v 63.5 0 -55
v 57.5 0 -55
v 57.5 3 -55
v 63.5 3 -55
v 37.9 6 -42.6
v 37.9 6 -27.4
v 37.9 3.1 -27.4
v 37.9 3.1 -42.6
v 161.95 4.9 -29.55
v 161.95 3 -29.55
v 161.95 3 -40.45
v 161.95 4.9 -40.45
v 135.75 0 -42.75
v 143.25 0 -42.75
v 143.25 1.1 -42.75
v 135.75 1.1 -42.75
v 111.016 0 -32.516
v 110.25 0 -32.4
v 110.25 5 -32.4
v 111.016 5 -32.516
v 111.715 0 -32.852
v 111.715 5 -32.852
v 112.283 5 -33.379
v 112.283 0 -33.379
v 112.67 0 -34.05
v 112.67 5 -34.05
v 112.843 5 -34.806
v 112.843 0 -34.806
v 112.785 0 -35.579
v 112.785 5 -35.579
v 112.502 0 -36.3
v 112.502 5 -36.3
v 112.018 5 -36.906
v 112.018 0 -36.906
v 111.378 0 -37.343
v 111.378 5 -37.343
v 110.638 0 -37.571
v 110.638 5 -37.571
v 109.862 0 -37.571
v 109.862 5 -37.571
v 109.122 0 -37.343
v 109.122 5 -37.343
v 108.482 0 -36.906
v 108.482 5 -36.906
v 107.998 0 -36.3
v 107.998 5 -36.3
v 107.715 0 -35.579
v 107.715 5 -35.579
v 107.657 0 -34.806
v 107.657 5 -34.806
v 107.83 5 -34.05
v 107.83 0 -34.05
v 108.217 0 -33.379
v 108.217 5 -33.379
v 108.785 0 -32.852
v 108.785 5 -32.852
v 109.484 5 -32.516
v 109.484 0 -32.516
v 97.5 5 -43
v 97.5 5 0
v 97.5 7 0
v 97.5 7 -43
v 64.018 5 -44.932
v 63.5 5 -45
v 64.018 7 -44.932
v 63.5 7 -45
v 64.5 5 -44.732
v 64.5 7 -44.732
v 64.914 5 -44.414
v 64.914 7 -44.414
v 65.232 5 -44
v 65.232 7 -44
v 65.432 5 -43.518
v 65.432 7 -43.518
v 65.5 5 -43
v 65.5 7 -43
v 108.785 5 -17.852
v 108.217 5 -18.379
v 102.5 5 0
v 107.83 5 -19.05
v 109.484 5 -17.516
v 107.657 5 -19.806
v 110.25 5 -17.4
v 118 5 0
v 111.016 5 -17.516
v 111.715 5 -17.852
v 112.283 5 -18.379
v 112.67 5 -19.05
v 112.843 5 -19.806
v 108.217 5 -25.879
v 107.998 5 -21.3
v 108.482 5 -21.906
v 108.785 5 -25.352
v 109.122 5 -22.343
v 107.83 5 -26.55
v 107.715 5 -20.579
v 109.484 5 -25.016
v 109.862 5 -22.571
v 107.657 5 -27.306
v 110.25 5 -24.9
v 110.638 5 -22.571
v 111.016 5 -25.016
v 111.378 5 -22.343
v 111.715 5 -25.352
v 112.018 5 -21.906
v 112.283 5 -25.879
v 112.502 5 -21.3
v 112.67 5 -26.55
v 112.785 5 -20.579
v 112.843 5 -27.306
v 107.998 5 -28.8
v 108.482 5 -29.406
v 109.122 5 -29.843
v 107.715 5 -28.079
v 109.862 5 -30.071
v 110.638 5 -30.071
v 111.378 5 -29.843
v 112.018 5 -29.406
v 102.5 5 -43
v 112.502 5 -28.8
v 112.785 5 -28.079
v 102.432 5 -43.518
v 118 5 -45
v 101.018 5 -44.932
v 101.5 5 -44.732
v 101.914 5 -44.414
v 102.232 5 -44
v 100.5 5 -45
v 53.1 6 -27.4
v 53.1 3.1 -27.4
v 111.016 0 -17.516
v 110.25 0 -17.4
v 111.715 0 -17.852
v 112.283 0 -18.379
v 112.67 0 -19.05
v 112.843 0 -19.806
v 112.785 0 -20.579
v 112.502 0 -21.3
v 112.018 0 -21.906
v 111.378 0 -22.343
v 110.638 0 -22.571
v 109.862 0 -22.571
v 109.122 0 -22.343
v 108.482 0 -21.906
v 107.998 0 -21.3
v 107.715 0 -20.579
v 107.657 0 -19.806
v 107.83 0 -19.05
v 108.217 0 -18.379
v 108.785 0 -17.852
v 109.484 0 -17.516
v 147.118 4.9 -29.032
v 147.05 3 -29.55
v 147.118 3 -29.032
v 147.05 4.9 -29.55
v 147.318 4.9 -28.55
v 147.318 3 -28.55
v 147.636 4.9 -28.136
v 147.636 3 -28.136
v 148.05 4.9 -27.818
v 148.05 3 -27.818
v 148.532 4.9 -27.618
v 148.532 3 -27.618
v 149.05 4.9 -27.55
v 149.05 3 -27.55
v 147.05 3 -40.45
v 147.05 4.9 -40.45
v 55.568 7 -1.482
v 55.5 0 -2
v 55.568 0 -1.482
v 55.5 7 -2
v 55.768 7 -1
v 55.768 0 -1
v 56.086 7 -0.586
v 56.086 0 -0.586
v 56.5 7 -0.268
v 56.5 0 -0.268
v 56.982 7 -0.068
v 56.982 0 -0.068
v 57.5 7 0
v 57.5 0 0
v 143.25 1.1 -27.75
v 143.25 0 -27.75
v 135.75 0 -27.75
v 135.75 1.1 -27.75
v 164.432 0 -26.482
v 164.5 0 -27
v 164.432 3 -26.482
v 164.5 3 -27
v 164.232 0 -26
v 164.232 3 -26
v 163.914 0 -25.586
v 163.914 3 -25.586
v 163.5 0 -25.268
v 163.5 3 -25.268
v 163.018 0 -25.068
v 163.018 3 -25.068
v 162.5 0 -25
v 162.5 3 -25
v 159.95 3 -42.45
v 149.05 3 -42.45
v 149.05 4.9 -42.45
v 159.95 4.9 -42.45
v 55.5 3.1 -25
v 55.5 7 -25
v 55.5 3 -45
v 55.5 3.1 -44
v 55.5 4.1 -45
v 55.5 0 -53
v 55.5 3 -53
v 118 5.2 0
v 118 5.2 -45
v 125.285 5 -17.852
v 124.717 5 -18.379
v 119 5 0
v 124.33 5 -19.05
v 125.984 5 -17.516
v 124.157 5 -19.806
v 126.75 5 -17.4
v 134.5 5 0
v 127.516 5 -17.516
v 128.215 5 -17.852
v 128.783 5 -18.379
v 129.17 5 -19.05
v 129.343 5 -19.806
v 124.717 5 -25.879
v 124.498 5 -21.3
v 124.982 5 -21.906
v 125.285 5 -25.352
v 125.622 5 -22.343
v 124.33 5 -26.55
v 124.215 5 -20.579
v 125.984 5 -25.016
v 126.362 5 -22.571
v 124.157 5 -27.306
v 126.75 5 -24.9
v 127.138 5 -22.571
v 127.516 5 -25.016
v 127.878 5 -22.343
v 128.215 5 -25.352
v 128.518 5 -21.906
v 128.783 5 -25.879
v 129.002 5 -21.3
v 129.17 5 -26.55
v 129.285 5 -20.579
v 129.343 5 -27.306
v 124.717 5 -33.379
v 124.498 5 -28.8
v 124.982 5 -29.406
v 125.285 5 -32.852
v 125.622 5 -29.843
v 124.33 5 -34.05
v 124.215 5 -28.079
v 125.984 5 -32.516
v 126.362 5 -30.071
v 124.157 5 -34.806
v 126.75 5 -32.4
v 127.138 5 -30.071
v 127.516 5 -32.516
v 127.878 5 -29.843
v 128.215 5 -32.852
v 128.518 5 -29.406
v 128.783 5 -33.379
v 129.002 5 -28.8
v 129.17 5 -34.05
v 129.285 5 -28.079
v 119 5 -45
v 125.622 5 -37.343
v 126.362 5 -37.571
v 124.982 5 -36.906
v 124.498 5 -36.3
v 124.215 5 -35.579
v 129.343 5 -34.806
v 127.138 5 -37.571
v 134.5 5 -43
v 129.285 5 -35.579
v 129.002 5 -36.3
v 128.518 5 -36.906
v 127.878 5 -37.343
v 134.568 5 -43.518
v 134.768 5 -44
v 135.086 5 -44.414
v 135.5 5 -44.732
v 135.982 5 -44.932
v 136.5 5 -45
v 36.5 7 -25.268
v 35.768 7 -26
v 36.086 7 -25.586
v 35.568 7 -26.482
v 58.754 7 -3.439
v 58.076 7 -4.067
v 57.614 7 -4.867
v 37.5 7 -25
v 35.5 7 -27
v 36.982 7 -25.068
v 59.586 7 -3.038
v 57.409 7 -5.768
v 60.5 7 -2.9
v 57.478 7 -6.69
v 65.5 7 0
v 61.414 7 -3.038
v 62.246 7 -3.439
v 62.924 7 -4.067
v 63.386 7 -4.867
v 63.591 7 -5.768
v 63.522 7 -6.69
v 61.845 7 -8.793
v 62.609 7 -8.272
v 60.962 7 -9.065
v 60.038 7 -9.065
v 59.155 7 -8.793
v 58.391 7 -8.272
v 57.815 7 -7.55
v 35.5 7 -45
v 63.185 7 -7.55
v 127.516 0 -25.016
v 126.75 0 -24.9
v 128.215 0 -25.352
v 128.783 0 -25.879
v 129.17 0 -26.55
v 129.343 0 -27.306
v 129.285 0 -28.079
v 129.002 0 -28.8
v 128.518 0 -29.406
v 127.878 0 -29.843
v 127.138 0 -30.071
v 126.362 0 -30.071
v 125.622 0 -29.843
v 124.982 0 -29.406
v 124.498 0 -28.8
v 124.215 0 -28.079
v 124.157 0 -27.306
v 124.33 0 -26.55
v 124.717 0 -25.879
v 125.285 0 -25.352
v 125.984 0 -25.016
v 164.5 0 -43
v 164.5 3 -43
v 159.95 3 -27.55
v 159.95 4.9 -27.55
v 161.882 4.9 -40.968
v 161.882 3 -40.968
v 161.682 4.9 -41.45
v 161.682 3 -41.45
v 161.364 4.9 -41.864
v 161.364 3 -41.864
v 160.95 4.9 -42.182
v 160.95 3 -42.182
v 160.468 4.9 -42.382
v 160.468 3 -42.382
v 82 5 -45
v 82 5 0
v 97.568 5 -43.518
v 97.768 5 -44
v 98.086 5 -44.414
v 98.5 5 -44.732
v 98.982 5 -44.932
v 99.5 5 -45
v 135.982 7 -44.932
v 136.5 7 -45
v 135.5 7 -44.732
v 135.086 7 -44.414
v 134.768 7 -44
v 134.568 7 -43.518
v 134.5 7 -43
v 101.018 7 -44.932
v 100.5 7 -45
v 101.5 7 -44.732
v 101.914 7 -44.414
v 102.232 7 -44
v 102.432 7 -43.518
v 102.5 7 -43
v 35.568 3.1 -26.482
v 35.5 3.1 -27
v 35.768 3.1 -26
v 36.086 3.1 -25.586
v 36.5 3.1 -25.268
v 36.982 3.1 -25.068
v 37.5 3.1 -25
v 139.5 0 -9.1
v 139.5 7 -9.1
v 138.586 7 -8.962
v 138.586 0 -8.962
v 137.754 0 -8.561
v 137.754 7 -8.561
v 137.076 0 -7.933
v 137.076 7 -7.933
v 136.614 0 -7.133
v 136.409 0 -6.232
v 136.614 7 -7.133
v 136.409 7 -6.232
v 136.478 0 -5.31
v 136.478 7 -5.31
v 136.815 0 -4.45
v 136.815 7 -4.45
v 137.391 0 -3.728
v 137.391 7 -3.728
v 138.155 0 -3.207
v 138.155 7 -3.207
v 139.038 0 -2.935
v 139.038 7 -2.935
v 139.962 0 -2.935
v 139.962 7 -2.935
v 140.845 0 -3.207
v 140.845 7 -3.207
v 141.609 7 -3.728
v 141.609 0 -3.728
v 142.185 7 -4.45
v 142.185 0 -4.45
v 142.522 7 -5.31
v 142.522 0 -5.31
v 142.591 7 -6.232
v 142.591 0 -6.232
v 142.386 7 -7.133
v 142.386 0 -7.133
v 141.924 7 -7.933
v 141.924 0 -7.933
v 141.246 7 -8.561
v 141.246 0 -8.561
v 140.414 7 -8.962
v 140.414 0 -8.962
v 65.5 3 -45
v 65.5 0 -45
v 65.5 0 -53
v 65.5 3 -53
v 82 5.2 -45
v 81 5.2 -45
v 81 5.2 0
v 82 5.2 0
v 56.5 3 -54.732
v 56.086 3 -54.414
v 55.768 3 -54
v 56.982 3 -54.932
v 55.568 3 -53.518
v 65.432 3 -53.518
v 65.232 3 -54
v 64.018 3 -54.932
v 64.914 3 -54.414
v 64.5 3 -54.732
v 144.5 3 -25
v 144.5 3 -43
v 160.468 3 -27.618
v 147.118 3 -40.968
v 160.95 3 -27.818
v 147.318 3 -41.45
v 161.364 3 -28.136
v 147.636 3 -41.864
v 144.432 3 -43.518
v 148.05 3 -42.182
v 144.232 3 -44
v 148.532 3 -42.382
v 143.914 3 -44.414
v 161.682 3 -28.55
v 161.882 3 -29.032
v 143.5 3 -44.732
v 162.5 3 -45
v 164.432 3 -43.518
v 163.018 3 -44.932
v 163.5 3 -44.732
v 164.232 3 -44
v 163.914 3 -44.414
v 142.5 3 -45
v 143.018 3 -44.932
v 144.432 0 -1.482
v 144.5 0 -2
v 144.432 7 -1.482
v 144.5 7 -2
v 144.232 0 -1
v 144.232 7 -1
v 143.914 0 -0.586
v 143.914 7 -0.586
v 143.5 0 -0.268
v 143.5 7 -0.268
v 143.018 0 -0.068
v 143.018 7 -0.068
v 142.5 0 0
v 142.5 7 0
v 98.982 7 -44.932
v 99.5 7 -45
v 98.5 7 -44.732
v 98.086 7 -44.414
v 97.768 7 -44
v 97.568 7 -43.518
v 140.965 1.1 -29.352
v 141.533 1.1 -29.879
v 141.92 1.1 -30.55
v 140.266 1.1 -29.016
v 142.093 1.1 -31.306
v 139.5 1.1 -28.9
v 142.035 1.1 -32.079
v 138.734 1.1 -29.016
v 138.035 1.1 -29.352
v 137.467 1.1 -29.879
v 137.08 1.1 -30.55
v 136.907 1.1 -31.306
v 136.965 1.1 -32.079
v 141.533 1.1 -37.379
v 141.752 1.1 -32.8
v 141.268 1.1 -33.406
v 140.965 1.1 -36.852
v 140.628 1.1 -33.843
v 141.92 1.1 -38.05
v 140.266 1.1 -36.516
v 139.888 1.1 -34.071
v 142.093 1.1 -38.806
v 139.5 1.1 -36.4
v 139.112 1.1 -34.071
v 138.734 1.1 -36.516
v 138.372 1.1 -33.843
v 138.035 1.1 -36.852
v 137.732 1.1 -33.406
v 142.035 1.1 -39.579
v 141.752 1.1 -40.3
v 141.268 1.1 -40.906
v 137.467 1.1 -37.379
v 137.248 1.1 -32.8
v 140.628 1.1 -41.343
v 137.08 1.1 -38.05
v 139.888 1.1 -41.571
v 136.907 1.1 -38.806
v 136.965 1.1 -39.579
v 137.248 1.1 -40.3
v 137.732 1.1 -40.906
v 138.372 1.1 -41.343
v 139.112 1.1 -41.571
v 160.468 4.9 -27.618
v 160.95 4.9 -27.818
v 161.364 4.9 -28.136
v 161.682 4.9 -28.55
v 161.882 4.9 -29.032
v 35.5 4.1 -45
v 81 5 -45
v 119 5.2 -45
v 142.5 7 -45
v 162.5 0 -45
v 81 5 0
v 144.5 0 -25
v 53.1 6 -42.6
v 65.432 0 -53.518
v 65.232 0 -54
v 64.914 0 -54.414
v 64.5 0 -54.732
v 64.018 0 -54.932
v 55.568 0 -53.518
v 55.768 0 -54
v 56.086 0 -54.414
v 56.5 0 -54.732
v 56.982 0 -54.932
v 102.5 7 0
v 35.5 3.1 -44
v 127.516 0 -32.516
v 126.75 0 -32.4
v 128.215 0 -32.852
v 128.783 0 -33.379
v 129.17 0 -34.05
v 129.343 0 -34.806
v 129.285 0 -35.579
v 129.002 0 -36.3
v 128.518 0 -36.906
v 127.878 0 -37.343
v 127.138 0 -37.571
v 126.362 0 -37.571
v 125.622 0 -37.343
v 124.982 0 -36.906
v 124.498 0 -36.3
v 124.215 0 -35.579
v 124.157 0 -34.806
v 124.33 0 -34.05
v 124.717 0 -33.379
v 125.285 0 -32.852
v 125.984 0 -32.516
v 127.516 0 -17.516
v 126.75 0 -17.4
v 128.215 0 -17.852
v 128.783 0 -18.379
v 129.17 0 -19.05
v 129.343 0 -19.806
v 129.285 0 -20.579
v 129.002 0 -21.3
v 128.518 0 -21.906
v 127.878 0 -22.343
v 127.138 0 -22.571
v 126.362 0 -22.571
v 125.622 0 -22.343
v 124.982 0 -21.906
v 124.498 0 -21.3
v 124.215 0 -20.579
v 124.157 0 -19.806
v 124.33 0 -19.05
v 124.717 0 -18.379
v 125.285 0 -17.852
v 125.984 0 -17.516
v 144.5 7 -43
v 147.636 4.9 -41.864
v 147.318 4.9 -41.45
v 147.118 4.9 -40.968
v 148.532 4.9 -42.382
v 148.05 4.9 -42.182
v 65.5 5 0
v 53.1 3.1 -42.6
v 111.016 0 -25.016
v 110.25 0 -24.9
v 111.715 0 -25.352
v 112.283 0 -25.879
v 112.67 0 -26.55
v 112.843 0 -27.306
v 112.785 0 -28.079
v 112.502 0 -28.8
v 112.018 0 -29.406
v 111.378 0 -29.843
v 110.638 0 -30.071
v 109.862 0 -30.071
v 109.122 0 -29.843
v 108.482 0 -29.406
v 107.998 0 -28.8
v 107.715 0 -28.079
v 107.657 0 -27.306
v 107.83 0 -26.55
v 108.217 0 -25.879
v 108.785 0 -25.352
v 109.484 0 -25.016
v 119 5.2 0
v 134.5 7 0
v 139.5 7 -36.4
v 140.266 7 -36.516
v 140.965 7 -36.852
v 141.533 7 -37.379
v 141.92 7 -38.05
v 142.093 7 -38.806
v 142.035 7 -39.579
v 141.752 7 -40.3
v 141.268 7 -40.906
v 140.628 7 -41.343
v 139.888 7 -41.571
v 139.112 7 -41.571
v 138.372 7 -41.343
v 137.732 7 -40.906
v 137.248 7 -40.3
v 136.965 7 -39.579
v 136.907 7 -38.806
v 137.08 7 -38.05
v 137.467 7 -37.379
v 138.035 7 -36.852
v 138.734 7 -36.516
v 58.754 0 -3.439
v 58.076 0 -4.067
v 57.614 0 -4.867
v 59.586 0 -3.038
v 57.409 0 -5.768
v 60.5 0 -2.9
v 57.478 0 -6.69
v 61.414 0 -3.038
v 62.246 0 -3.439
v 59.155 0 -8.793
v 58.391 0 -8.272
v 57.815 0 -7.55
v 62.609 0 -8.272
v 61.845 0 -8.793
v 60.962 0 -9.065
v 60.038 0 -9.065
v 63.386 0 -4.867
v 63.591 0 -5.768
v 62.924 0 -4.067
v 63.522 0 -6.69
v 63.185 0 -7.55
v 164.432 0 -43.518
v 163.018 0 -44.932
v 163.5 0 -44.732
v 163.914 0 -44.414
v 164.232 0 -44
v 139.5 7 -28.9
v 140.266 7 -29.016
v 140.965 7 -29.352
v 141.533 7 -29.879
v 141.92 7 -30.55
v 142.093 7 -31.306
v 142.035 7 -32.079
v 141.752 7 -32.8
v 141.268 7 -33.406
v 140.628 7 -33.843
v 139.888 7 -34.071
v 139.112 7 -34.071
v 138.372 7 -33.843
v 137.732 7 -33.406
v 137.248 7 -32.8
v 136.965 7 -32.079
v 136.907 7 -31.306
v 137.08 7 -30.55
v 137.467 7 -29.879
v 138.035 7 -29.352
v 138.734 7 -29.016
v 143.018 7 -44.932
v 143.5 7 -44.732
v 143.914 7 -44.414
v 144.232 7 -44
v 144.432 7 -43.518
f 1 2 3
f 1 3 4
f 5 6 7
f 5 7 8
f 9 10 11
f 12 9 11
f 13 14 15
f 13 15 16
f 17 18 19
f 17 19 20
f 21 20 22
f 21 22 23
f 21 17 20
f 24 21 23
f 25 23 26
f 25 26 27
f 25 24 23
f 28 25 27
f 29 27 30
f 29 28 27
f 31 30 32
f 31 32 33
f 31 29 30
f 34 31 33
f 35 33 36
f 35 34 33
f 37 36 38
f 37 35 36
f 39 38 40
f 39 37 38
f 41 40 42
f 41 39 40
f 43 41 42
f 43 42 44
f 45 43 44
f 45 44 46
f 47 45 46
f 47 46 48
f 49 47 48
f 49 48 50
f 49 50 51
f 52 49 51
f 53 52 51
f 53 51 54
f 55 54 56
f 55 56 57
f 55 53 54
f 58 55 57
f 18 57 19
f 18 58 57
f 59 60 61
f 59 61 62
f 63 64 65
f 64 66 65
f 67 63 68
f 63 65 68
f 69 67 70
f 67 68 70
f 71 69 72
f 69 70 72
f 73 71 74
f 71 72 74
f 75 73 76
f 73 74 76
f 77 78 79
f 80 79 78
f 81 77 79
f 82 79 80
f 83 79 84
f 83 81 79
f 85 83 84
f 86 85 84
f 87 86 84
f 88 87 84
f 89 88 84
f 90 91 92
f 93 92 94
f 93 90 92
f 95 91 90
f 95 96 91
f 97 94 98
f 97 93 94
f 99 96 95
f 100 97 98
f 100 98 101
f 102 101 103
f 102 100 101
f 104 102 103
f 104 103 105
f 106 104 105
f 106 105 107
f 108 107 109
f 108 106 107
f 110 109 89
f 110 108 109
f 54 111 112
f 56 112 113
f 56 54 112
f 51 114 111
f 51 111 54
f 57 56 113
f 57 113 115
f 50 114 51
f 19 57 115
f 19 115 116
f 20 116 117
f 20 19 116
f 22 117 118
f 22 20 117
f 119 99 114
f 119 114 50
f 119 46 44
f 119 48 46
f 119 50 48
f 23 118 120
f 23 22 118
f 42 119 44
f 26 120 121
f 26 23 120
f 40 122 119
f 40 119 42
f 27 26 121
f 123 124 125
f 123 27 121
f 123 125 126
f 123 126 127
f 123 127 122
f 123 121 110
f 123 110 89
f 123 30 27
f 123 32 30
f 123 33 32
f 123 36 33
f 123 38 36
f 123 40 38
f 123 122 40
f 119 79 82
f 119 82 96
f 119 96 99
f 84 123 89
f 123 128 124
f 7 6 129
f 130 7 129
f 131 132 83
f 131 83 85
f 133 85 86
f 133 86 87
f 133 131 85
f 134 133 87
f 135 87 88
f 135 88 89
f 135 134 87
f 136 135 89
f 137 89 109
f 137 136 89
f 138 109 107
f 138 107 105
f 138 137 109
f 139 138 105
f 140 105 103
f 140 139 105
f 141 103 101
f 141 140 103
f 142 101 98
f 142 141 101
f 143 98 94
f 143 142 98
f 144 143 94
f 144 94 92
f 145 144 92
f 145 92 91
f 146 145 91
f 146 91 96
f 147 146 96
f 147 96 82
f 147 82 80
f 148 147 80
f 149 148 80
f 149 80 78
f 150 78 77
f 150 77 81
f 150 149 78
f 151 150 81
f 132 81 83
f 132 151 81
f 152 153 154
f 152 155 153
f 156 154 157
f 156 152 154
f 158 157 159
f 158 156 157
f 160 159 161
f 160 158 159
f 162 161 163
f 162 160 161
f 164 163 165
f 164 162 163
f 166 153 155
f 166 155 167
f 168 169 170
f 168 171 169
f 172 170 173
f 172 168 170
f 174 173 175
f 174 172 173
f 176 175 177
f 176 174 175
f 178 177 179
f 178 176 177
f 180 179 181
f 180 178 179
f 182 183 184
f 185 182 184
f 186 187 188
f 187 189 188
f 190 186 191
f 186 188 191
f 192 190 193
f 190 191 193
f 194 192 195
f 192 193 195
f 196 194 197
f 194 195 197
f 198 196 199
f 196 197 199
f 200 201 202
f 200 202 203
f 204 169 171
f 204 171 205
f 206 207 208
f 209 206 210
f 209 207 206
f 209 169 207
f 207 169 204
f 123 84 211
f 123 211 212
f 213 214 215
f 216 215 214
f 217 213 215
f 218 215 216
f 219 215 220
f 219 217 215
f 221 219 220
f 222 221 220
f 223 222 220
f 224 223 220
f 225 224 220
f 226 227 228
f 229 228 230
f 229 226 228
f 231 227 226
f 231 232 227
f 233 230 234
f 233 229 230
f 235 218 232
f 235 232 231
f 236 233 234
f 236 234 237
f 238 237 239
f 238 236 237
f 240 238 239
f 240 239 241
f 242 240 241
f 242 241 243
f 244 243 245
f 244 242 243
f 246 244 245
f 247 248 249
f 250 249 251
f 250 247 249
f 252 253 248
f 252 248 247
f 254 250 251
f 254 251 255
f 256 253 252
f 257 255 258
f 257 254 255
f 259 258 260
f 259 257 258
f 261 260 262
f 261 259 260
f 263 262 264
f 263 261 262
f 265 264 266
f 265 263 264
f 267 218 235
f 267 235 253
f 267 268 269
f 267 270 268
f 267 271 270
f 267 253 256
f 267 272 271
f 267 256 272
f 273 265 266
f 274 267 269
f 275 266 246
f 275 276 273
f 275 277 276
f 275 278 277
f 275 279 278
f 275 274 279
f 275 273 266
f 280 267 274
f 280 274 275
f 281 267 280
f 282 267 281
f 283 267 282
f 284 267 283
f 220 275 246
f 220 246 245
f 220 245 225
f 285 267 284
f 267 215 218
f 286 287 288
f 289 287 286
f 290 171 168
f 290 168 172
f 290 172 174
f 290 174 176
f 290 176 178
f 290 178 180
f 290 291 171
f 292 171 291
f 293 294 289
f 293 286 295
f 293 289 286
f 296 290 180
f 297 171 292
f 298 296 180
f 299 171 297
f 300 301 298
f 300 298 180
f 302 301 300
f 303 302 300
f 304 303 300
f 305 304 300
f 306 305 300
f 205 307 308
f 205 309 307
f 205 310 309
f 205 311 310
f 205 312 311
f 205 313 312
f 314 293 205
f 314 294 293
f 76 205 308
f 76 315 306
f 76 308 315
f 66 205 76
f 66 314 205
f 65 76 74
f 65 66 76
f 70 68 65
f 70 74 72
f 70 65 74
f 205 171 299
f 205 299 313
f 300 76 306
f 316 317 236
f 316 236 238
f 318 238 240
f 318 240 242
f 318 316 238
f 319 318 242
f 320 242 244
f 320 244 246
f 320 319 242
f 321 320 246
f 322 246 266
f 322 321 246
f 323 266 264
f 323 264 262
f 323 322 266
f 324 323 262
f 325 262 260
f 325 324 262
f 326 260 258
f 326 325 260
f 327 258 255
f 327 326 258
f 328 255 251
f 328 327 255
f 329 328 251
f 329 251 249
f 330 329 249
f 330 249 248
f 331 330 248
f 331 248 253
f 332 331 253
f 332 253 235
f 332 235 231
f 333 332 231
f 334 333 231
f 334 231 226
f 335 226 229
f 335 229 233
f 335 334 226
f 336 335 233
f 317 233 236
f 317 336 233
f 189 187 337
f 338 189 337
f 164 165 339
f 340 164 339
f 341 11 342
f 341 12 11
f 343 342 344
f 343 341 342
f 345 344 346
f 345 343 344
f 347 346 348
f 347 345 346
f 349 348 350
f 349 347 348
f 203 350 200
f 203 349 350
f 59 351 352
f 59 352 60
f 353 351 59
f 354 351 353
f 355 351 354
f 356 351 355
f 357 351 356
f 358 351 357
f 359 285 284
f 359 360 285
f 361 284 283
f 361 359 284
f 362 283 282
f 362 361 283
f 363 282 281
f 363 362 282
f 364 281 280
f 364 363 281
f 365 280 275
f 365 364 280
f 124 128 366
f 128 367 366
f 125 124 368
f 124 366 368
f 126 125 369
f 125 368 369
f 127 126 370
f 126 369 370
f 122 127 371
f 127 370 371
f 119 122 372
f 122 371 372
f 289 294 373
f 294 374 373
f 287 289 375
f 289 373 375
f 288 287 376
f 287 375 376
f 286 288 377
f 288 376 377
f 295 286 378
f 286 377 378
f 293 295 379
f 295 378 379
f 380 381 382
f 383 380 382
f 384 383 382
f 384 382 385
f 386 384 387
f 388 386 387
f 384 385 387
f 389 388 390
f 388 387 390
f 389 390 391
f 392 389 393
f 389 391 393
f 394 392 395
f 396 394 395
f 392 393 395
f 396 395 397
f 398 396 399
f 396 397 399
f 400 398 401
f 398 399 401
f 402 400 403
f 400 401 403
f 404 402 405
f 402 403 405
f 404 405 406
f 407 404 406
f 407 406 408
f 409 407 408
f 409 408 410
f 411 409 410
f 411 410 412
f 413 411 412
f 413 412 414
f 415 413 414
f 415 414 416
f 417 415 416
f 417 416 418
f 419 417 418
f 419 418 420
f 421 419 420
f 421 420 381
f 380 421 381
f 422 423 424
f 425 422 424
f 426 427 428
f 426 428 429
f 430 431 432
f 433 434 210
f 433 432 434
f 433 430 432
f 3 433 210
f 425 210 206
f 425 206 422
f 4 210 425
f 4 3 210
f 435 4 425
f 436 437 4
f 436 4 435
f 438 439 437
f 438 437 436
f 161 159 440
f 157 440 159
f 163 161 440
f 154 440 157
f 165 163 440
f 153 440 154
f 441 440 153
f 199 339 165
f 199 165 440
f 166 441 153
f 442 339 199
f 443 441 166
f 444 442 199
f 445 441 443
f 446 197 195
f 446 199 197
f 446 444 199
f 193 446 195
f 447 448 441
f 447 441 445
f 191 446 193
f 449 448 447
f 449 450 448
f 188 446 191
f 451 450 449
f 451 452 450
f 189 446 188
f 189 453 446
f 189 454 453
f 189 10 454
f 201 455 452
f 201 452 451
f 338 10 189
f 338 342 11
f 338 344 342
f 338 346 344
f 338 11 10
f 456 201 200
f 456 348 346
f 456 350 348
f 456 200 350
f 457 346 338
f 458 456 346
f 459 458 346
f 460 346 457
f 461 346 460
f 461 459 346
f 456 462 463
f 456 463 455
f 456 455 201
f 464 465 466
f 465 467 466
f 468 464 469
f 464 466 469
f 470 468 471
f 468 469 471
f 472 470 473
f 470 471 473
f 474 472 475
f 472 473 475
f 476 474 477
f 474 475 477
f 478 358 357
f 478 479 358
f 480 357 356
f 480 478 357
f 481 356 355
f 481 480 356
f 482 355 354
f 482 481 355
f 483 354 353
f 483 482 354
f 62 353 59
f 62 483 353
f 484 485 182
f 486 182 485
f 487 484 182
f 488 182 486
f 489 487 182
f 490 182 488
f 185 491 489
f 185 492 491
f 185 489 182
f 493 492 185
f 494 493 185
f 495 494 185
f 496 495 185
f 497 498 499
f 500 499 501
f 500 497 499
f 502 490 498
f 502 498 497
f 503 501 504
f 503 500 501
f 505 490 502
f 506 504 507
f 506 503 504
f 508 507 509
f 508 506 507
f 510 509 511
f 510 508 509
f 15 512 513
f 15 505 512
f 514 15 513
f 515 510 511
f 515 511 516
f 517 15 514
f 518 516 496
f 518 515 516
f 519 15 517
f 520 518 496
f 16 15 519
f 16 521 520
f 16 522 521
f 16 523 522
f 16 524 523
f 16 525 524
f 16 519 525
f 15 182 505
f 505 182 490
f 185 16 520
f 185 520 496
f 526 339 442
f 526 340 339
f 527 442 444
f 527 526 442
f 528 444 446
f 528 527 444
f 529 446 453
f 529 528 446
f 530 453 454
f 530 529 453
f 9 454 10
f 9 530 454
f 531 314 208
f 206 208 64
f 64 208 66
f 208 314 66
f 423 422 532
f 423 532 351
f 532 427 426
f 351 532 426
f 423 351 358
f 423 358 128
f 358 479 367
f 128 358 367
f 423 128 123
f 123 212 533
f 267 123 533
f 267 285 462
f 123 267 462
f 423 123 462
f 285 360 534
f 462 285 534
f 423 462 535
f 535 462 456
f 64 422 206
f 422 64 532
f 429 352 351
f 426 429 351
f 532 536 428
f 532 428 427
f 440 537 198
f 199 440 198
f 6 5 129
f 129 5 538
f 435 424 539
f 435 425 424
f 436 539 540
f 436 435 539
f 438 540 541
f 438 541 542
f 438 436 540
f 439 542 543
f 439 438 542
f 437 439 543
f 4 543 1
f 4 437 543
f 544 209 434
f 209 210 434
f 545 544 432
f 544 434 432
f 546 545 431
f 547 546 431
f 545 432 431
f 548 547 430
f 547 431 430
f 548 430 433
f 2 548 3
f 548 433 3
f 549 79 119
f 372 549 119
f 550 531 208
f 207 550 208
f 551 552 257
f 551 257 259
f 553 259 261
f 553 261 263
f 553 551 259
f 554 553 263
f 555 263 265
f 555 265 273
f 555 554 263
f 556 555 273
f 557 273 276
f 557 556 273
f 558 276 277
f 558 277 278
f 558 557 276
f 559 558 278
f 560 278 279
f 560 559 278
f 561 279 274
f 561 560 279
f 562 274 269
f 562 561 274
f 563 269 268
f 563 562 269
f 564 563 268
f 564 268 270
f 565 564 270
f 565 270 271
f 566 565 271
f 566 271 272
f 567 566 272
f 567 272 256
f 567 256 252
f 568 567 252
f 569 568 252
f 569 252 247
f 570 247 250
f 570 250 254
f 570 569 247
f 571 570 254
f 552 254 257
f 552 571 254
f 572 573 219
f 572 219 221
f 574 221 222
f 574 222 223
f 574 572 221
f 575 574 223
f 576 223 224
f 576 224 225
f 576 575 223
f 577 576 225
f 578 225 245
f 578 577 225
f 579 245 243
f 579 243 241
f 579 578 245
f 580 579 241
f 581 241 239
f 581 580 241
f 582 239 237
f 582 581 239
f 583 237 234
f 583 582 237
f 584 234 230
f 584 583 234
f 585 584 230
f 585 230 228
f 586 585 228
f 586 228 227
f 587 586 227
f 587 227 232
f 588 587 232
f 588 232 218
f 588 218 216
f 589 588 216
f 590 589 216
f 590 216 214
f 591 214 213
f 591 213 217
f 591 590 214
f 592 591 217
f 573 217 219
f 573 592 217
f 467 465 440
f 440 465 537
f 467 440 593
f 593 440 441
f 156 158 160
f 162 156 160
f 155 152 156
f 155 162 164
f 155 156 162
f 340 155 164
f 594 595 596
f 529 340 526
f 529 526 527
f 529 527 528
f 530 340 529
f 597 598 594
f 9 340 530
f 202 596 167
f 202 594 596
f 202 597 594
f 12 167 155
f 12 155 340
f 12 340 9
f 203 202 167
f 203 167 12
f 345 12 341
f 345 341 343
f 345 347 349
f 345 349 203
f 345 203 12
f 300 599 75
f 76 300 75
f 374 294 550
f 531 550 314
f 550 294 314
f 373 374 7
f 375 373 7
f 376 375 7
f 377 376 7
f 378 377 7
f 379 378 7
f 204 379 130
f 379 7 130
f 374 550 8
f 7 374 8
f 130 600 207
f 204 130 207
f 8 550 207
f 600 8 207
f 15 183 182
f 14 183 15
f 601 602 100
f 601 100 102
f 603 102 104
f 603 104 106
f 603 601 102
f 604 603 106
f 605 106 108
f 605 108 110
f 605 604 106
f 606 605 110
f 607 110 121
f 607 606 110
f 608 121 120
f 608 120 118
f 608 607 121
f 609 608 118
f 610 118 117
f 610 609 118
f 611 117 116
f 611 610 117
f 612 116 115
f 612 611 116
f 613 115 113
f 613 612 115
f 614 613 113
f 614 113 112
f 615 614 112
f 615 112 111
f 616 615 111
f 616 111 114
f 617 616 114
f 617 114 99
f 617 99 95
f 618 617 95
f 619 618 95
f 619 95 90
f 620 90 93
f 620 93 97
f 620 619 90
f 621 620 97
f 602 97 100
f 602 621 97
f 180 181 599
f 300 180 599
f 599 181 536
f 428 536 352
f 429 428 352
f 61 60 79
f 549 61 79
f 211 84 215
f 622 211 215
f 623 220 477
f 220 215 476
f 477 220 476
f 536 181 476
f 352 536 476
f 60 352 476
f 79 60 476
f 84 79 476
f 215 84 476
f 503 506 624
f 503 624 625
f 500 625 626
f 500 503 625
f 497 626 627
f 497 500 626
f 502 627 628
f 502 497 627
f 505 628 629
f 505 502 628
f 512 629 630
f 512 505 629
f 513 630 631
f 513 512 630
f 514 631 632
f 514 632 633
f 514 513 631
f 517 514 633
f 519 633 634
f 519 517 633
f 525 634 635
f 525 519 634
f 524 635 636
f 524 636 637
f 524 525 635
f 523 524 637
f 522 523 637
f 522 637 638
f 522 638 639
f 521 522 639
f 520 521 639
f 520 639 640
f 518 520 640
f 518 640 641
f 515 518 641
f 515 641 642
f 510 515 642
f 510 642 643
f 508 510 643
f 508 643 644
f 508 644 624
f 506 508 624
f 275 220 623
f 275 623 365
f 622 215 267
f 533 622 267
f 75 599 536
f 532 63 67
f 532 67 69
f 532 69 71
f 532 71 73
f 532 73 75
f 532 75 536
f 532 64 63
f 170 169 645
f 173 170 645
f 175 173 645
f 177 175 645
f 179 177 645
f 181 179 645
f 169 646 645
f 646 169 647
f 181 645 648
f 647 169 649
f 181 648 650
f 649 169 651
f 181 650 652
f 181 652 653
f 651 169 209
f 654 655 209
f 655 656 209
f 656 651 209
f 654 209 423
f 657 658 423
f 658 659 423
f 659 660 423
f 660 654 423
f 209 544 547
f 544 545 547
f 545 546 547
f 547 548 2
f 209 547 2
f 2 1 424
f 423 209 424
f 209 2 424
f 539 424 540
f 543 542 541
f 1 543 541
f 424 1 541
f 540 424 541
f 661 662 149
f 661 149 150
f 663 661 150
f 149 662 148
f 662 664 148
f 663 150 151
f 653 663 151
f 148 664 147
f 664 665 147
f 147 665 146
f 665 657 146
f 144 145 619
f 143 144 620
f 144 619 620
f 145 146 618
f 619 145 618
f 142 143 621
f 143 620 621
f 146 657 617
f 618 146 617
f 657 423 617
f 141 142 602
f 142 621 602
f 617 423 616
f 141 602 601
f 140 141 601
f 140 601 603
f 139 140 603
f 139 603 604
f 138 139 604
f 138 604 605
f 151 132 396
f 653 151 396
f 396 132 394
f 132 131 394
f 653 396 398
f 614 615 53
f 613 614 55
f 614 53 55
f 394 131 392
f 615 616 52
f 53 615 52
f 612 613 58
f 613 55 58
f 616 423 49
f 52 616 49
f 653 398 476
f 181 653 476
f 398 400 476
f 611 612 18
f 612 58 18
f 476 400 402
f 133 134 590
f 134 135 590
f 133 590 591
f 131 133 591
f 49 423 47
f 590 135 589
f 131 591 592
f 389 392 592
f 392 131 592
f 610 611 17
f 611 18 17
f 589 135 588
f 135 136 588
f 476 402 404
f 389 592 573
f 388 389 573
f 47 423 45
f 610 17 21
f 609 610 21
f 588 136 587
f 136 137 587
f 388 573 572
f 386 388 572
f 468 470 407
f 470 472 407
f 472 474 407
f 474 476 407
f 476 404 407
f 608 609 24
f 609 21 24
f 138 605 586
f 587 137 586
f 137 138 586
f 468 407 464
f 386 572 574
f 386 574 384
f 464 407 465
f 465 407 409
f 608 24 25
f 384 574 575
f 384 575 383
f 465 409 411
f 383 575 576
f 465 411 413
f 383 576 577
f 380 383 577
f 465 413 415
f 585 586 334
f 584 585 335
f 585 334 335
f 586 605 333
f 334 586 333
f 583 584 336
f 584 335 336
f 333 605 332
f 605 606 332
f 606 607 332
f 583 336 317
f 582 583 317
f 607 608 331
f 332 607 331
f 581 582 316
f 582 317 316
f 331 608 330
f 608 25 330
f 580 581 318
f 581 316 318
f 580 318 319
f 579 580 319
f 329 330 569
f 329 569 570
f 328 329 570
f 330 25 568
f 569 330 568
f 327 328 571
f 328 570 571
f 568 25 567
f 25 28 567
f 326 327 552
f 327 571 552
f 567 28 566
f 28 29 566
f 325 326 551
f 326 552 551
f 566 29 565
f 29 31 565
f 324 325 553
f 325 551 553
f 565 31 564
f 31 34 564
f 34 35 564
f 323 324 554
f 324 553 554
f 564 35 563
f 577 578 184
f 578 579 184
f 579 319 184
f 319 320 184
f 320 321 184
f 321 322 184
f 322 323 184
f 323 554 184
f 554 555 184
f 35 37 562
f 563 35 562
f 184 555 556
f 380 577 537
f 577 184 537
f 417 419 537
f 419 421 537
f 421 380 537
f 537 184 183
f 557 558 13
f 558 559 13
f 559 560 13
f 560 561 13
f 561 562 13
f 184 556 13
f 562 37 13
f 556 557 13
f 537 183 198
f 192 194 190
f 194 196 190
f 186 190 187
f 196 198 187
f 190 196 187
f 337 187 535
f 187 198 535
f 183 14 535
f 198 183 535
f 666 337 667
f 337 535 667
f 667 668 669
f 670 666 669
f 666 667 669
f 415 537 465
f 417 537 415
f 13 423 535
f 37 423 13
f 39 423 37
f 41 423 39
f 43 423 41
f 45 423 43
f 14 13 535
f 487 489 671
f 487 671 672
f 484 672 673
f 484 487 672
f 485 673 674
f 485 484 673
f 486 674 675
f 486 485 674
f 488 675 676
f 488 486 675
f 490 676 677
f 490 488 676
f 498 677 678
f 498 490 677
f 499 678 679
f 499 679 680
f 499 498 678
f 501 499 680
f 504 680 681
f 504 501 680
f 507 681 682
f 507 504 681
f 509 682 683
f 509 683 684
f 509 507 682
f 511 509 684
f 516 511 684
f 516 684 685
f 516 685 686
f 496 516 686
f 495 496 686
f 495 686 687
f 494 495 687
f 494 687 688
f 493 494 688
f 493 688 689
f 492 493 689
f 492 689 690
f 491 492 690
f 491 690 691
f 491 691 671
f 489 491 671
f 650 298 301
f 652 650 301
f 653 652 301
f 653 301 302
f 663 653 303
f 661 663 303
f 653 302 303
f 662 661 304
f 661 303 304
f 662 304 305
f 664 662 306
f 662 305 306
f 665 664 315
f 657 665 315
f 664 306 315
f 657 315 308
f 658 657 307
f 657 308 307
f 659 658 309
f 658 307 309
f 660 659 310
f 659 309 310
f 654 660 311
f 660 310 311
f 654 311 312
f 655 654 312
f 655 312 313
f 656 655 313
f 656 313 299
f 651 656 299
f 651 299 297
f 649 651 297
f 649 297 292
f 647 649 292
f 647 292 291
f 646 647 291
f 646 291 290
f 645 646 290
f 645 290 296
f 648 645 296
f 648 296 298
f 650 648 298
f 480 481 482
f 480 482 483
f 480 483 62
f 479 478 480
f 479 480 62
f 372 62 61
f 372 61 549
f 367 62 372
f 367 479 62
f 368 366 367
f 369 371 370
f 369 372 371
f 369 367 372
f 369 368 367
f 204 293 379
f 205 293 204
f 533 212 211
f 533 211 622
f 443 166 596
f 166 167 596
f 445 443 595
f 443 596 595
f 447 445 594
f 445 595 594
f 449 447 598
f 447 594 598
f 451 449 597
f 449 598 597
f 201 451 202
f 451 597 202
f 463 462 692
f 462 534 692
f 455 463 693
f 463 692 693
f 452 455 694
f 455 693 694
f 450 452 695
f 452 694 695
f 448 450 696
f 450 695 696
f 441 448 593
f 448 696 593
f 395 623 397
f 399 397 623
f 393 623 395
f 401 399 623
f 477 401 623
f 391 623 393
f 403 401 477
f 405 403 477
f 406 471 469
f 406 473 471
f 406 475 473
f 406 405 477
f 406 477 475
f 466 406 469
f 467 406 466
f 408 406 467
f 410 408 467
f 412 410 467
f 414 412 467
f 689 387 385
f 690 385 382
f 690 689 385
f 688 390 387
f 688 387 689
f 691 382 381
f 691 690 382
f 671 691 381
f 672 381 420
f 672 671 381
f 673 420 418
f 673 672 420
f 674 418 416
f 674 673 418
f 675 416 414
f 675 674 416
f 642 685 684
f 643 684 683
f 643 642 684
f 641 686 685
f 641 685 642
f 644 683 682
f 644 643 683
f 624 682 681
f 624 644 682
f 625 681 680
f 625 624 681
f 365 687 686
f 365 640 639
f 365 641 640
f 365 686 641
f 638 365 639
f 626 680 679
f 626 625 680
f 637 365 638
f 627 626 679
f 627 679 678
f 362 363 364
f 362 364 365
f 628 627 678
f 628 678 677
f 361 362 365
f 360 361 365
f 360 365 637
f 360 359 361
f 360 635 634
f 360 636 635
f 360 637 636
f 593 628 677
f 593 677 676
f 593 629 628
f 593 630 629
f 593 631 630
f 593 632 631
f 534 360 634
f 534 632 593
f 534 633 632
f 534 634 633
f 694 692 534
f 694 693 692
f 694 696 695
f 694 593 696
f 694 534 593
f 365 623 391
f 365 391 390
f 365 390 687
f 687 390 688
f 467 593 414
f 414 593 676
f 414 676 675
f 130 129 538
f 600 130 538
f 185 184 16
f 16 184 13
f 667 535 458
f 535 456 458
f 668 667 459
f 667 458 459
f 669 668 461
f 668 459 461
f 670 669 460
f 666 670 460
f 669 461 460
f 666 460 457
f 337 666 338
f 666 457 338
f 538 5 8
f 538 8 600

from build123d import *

# Parameters (mm, degrees)
SKETCH1_W             = 15.5
SKETCH1_H             = 45
BOSS_EXTRUDE1_DEPTH   = 5
BOSS_EXTRUDE1_2_DEPTH = 5
SKETCH1_R             = 2.6
BOSS_EXTRUDE1_3_DEPTH = 5
BOSS_EXTRUDE1_4_DEPTH = 5
SKETCH1_3_W           = 1
SKETCH1_3_H           = 45
BOSS_EXTRUDE2_DEPTH   = 5.2
SKETCH1_4_W           = 5
SKETCH1_4_H           = 45
SKETCH1_4_W_2         = 10
SKETCH1_4_R           = 2.6
BOSS_EXTRUDE3_DEPTH   = 7
SKETCH2_W             = 7.5
SKETCH2_H             = 15
CUT_EXTRUDE1_DEPTH    = 1.1
SKETCH3_R             = 3.1
CUT_EXTRUDE2_DEPTH    = 152.506600516
SKETCH5_W             = 20
SKETCH5_H             = 20
SKETCH5_W_2           = 14.9
SKETCH5_H_2           = 14.9
BOSS_EXTRUDE4_DEPTH   = 3
SKETCH5_3_W           = 14.9
SKETCH5_3_H           = 14.9
BOSS_EXTRUDE5_DEPTH   = 4.9
BOSS_EXTRUDE6_START   = 7
SKETCH5_4_W           = 20
SKETCH5_4_H           = 20
SKETCH5_4_W_2         = 15.2
SKETCH5_4_H_2         = 15.2
BOSS_EXTRUDE6_DEPTH   = 3.9
BOSS_EXTRUDE7_START   = 7
SKETCH5_5_W           = 15.2
SKETCH5_5_H           = 15.2
BOSS_EXTRUDE7_DEPTH   = 1
FILLET1_R             = 2
BOSS_EXTRUDE8_START   = -7
SKETCH6_W             = 10
SKETCH6_H             = 10
BOSS_EXTRUDE8_DEPTH   = 3
FILLET3_R             = 2
CHAMFER1_SIZE         = 1


with BuildPart() as part:
    # Sketch1 → Boss-Extrude1 (new body)
    with BuildSketch(Plane(origin=(0, 0, 0), x_dir=(1, 0, 0), z_dir=(0, 1, 0))):
        with Locations((73.25, 22.5)):
            Rectangle(SKETCH1_W, SKETCH1_H)
    extrude(amount=BOSS_EXTRUDE1_DEPTH)



with BuildPart() as body_2:
    # Sketch1 → Boss-Extrude1 2 (new body)
    with BuildSketch(Plane(origin=(0, 0, 0), x_dir=(1, 0, 0), z_dir=(0, 1, 0))):
        with Locations((89.75, 22.5)):
            Rectangle(SKETCH1_W, SKETCH1_H)
    extrude(amount=BOSS_EXTRUDE1_2_DEPTH)


with BuildPart() as body_3:
    # Sketch1 → Boss-Extrude1 3 (new body)
    with BuildSketch(Plane(origin=(0, 0, 0), x_dir=(1, 0, 0), z_dir=(0, 1, 0))):
        with Locations((110.25, 22.5)):
            Rectangle(SKETCH1_W, SKETCH1_H)
        with Locations(Location((110.25, 20, 0), (0, 0, 270))):
            Circle(SKETCH1_R, mode=Mode.SUBTRACT)
        with Locations(Location((110.25, 27.5, 0), (0, 0, 270))):
            Circle(SKETCH1_R, mode=Mode.SUBTRACT)
        with Locations(Location((110.25, 35, 0), (0, 0, 270))):
            Circle(SKETCH1_R, mode=Mode.SUBTRACT)
    extrude(amount=BOSS_EXTRUDE1_3_DEPTH)


with BuildPart() as body_4:
    # Sketch1 → Boss-Extrude1 4 (new body)
    with BuildSketch(Plane(origin=(0, 0, 0), x_dir=(1, 0, 0), z_dir=(0, 1, 0))):
        with Locations((126.75, 22.5)):
            Rectangle(SKETCH1_W, SKETCH1_H)
        with Locations(Location((126.75, 20, 0), (0, 0, 270))):
            Circle(SKETCH1_R, mode=Mode.SUBTRACT)
        with Locations(Location((126.75, 27.5, 0), (0, 0, 270))):
            Circle(SKETCH1_R, mode=Mode.SUBTRACT)
        with Locations(Location((126.75, 35, 0), (0, 0, 270))):
            Circle(SKETCH1_R, mode=Mode.SUBTRACT)
    extrude(amount=BOSS_EXTRUDE1_4_DEPTH)


with BuildPart() as part_1:
    add(part.part)

    add(body_2.part)  # Boss-Extrude2 merges body 2

    add(body_3.part)  # Boss-Extrude2 merges body 3

    add(body_4.part)  # Boss-Extrude2 merges body 4
    # Sketch1<3> → Boss-Extrude2 (add)
    with BuildSketch(Plane(origin=(0, 0, 0), x_dir=(1, 0, 0), z_dir=(0, 1, 0))):
        with Locations((81.5, 22.5)):
            Rectangle(SKETCH1_3_W, SKETCH1_3_H)
        with Locations((118.5, 22.5)):
            Rectangle(SKETCH1_3_W, SKETCH1_3_H)
    extrude(amount=BOSS_EXTRUDE2_DEPTH)

    # Sketch1<4> → Boss-Extrude3 (add)
    # profile 1 of 3: a face of its own
    with BuildSketch(Plane(origin=(0, 0, 0), x_dir=(1, 0, 0), z_dir=(0, 1, 0))):
        with Locations((100, 22.5)):
            Rectangle(SKETCH1_4_W, SKETCH1_4_H)
    # profile 2 of 3: a face of its own
    with BuildSketch(Plane(origin=(0, 0, 0), x_dir=(1, 0, 0), z_dir=(0, 1, 0))):
        with Locations((139.5, 22.5)):
            Rectangle(SKETCH1_4_W_2, SKETCH1_4_H)
        with Locations(Location((139.5, 31.5, 0), (0, 0, 270))):
            Circle(SKETCH1_4_R, mode=Mode.SUBTRACT)
        with Locations(Location((139.5, 39, 0), (0, 0, 270))):
            Circle(SKETCH1_4_R, mode=Mode.SUBTRACT)
    # profile 3 of 3: a face of its own
    with BuildSketch(Plane(origin=(0, 0, 0), x_dir=(1, 0, 0), z_dir=(0, 1, 0))):
        with Locations((60.5, 22.5)):
            Rectangle(SKETCH1_4_W_2, SKETCH1_4_H)
    extrude(amount=BOSS_EXTRUDE3_DEPTH)

    # Sketch2 → Cut-Extrude1 (cut)
    with BuildSketch(Plane(origin=(0, 0, 0), x_dir=(-1, 0, 0), z_dir=(0, -1, 0))):
        with Locations((-139.5, 35.25)):
            Rectangle(SKETCH2_W, SKETCH2_H)
    extrude(amount=-CUT_EXTRUDE1_DEPTH, mode=Mode.SUBTRACT)

    # Sketch3 → Cut-Extrude2 (cut, through all)
    with BuildSketch(Plane(origin=(0, 7, 0), x_dir=(1, 0, 0), z_dir=(0, 1, 0))):
        with Locations(Location((60.5, 6, 0), (0, 0, 270))):
            Circle(SKETCH3_R)
        with Locations(Location((139.5, 6, 0), (0, 0, 90))):
            Circle(SKETCH3_R)
    extrude(amount=-CUT_EXTRUDE2_DEPTH, mode=Mode.SUBTRACT)

    # Sketch5 → Boss-Extrude4 (add)
    # profile 1 of 2: a face of its own
    with BuildSketch(Plane(origin=(0, 0, 0), x_dir=(1, 0, 0), z_dir=(0, 1, 0))):
        with Locations((154.5, 35)):
            Rectangle(SKETCH5_W, SKETCH5_H)
        with Locations((154.5, 35)):
            Rectangle(SKETCH5_W_2, SKETCH5_H_2, mode=Mode.SUBTRACT)
    # profile 2 of 2: a face of its own
    with BuildSketch(Plane(origin=(0, 0, 0), x_dir=(1, 0, 0), z_dir=(0, 1, 0))):
        with Locations((154.5, 35)):
            Rectangle(SKETCH5_W_2, SKETCH5_H_2)
    extrude(amount=BOSS_EXTRUDE4_DEPTH)

    # Sketch5<3> → Boss-Extrude5 (add)
    with BuildSketch(Plane(origin=(0, 0, 0), x_dir=(1, 0, 0), z_dir=(0, 1, 0))):
        with Locations((154.5, 35)):
            Rectangle(SKETCH5_3_W, SKETCH5_3_H)
    extrude(amount=BOSS_EXTRUDE5_DEPTH)

    # Sketch5<4> → Boss-Extrude6 (add)
    with BuildSketch(Plane(origin=(0, 0, 0), x_dir=(1, 0, 0), z_dir=(0, 1, 0)).offset(BOSS_EXTRUDE6_START)):
        with Locations((45.5, 35)):
            Rectangle(SKETCH5_4_W, SKETCH5_4_H)
        with Locations((45.5, 35)):
            Rectangle(SKETCH5_4_W_2, SKETCH5_4_H_2, mode=Mode.SUBTRACT)
    extrude(amount=-BOSS_EXTRUDE6_DEPTH)

    # Sketch5<5> → Boss-Extrude7 (add)
    with BuildSketch(Plane(origin=(0, 0, 0), x_dir=(1, 0, 0), z_dir=(0, 1, 0)).offset(BOSS_EXTRUDE7_START)):
        with Locations((45.5, 35)):
            Rectangle(SKETCH5_5_W, SKETCH5_5_H)
    extrude(amount=-BOSS_EXTRUDE7_DEPTH)

    # Fillet1
    fillet1_edges = [part_1.edges().sort_by_distance(p)[0] for p in [
        (161.95, 3.95, -42.45),
        (147.05, 3.95, -42.45),
        (147.05, 3.95, -27.55),
        (161.95, 3.95, -27.55),
    ]]
    fillet(fillet1_edges, radius=FILLET1_R)

    # Sketch6 → Boss-Extrude8 (add)
    with BuildSketch(Plane(origin=(0, 7, 0), x_dir=(1, 0, 0), z_dir=(0, 1, 0)).offset(BOSS_EXTRUDE8_START)):
        with Locations((60.5, 50)):
            Rectangle(SKETCH6_W, SKETCH6_H)
    extrude(amount=BOSS_EXTRUDE8_DEPTH)

    # Fillet3
    fillet3_edges = [part_1.edges().sort_by_distance(p)[0] for p in [
        (164.5, 1.5, -45),
        (164.5, 1.5, -25),
        (35.5, 5.05, -25),
        (65.5, 1.5, -55),
        (55.5, 1.5, -55),
        (97.5, 6, -45),
        (102.5, 6, -45),
        (134.5, 6, -45),
        (144.5, 3.5, 0),
        (144.5, 5, -45),
        (55.5, 3.5, 0),
        (65.5, 6, -45),
    ]]
    fillet(fillet3_edges, radius=FILLET3_R)

    # Chamfer1
    chamfer1_edges = [part_1.edges().sort_by_distance(p)[0] for p in [
        (45.5, 3.1, -45),
    ]]
    chamfer(chamfer1_edges, length=CHAMFER1_SIZE)


solid = part_1.part
